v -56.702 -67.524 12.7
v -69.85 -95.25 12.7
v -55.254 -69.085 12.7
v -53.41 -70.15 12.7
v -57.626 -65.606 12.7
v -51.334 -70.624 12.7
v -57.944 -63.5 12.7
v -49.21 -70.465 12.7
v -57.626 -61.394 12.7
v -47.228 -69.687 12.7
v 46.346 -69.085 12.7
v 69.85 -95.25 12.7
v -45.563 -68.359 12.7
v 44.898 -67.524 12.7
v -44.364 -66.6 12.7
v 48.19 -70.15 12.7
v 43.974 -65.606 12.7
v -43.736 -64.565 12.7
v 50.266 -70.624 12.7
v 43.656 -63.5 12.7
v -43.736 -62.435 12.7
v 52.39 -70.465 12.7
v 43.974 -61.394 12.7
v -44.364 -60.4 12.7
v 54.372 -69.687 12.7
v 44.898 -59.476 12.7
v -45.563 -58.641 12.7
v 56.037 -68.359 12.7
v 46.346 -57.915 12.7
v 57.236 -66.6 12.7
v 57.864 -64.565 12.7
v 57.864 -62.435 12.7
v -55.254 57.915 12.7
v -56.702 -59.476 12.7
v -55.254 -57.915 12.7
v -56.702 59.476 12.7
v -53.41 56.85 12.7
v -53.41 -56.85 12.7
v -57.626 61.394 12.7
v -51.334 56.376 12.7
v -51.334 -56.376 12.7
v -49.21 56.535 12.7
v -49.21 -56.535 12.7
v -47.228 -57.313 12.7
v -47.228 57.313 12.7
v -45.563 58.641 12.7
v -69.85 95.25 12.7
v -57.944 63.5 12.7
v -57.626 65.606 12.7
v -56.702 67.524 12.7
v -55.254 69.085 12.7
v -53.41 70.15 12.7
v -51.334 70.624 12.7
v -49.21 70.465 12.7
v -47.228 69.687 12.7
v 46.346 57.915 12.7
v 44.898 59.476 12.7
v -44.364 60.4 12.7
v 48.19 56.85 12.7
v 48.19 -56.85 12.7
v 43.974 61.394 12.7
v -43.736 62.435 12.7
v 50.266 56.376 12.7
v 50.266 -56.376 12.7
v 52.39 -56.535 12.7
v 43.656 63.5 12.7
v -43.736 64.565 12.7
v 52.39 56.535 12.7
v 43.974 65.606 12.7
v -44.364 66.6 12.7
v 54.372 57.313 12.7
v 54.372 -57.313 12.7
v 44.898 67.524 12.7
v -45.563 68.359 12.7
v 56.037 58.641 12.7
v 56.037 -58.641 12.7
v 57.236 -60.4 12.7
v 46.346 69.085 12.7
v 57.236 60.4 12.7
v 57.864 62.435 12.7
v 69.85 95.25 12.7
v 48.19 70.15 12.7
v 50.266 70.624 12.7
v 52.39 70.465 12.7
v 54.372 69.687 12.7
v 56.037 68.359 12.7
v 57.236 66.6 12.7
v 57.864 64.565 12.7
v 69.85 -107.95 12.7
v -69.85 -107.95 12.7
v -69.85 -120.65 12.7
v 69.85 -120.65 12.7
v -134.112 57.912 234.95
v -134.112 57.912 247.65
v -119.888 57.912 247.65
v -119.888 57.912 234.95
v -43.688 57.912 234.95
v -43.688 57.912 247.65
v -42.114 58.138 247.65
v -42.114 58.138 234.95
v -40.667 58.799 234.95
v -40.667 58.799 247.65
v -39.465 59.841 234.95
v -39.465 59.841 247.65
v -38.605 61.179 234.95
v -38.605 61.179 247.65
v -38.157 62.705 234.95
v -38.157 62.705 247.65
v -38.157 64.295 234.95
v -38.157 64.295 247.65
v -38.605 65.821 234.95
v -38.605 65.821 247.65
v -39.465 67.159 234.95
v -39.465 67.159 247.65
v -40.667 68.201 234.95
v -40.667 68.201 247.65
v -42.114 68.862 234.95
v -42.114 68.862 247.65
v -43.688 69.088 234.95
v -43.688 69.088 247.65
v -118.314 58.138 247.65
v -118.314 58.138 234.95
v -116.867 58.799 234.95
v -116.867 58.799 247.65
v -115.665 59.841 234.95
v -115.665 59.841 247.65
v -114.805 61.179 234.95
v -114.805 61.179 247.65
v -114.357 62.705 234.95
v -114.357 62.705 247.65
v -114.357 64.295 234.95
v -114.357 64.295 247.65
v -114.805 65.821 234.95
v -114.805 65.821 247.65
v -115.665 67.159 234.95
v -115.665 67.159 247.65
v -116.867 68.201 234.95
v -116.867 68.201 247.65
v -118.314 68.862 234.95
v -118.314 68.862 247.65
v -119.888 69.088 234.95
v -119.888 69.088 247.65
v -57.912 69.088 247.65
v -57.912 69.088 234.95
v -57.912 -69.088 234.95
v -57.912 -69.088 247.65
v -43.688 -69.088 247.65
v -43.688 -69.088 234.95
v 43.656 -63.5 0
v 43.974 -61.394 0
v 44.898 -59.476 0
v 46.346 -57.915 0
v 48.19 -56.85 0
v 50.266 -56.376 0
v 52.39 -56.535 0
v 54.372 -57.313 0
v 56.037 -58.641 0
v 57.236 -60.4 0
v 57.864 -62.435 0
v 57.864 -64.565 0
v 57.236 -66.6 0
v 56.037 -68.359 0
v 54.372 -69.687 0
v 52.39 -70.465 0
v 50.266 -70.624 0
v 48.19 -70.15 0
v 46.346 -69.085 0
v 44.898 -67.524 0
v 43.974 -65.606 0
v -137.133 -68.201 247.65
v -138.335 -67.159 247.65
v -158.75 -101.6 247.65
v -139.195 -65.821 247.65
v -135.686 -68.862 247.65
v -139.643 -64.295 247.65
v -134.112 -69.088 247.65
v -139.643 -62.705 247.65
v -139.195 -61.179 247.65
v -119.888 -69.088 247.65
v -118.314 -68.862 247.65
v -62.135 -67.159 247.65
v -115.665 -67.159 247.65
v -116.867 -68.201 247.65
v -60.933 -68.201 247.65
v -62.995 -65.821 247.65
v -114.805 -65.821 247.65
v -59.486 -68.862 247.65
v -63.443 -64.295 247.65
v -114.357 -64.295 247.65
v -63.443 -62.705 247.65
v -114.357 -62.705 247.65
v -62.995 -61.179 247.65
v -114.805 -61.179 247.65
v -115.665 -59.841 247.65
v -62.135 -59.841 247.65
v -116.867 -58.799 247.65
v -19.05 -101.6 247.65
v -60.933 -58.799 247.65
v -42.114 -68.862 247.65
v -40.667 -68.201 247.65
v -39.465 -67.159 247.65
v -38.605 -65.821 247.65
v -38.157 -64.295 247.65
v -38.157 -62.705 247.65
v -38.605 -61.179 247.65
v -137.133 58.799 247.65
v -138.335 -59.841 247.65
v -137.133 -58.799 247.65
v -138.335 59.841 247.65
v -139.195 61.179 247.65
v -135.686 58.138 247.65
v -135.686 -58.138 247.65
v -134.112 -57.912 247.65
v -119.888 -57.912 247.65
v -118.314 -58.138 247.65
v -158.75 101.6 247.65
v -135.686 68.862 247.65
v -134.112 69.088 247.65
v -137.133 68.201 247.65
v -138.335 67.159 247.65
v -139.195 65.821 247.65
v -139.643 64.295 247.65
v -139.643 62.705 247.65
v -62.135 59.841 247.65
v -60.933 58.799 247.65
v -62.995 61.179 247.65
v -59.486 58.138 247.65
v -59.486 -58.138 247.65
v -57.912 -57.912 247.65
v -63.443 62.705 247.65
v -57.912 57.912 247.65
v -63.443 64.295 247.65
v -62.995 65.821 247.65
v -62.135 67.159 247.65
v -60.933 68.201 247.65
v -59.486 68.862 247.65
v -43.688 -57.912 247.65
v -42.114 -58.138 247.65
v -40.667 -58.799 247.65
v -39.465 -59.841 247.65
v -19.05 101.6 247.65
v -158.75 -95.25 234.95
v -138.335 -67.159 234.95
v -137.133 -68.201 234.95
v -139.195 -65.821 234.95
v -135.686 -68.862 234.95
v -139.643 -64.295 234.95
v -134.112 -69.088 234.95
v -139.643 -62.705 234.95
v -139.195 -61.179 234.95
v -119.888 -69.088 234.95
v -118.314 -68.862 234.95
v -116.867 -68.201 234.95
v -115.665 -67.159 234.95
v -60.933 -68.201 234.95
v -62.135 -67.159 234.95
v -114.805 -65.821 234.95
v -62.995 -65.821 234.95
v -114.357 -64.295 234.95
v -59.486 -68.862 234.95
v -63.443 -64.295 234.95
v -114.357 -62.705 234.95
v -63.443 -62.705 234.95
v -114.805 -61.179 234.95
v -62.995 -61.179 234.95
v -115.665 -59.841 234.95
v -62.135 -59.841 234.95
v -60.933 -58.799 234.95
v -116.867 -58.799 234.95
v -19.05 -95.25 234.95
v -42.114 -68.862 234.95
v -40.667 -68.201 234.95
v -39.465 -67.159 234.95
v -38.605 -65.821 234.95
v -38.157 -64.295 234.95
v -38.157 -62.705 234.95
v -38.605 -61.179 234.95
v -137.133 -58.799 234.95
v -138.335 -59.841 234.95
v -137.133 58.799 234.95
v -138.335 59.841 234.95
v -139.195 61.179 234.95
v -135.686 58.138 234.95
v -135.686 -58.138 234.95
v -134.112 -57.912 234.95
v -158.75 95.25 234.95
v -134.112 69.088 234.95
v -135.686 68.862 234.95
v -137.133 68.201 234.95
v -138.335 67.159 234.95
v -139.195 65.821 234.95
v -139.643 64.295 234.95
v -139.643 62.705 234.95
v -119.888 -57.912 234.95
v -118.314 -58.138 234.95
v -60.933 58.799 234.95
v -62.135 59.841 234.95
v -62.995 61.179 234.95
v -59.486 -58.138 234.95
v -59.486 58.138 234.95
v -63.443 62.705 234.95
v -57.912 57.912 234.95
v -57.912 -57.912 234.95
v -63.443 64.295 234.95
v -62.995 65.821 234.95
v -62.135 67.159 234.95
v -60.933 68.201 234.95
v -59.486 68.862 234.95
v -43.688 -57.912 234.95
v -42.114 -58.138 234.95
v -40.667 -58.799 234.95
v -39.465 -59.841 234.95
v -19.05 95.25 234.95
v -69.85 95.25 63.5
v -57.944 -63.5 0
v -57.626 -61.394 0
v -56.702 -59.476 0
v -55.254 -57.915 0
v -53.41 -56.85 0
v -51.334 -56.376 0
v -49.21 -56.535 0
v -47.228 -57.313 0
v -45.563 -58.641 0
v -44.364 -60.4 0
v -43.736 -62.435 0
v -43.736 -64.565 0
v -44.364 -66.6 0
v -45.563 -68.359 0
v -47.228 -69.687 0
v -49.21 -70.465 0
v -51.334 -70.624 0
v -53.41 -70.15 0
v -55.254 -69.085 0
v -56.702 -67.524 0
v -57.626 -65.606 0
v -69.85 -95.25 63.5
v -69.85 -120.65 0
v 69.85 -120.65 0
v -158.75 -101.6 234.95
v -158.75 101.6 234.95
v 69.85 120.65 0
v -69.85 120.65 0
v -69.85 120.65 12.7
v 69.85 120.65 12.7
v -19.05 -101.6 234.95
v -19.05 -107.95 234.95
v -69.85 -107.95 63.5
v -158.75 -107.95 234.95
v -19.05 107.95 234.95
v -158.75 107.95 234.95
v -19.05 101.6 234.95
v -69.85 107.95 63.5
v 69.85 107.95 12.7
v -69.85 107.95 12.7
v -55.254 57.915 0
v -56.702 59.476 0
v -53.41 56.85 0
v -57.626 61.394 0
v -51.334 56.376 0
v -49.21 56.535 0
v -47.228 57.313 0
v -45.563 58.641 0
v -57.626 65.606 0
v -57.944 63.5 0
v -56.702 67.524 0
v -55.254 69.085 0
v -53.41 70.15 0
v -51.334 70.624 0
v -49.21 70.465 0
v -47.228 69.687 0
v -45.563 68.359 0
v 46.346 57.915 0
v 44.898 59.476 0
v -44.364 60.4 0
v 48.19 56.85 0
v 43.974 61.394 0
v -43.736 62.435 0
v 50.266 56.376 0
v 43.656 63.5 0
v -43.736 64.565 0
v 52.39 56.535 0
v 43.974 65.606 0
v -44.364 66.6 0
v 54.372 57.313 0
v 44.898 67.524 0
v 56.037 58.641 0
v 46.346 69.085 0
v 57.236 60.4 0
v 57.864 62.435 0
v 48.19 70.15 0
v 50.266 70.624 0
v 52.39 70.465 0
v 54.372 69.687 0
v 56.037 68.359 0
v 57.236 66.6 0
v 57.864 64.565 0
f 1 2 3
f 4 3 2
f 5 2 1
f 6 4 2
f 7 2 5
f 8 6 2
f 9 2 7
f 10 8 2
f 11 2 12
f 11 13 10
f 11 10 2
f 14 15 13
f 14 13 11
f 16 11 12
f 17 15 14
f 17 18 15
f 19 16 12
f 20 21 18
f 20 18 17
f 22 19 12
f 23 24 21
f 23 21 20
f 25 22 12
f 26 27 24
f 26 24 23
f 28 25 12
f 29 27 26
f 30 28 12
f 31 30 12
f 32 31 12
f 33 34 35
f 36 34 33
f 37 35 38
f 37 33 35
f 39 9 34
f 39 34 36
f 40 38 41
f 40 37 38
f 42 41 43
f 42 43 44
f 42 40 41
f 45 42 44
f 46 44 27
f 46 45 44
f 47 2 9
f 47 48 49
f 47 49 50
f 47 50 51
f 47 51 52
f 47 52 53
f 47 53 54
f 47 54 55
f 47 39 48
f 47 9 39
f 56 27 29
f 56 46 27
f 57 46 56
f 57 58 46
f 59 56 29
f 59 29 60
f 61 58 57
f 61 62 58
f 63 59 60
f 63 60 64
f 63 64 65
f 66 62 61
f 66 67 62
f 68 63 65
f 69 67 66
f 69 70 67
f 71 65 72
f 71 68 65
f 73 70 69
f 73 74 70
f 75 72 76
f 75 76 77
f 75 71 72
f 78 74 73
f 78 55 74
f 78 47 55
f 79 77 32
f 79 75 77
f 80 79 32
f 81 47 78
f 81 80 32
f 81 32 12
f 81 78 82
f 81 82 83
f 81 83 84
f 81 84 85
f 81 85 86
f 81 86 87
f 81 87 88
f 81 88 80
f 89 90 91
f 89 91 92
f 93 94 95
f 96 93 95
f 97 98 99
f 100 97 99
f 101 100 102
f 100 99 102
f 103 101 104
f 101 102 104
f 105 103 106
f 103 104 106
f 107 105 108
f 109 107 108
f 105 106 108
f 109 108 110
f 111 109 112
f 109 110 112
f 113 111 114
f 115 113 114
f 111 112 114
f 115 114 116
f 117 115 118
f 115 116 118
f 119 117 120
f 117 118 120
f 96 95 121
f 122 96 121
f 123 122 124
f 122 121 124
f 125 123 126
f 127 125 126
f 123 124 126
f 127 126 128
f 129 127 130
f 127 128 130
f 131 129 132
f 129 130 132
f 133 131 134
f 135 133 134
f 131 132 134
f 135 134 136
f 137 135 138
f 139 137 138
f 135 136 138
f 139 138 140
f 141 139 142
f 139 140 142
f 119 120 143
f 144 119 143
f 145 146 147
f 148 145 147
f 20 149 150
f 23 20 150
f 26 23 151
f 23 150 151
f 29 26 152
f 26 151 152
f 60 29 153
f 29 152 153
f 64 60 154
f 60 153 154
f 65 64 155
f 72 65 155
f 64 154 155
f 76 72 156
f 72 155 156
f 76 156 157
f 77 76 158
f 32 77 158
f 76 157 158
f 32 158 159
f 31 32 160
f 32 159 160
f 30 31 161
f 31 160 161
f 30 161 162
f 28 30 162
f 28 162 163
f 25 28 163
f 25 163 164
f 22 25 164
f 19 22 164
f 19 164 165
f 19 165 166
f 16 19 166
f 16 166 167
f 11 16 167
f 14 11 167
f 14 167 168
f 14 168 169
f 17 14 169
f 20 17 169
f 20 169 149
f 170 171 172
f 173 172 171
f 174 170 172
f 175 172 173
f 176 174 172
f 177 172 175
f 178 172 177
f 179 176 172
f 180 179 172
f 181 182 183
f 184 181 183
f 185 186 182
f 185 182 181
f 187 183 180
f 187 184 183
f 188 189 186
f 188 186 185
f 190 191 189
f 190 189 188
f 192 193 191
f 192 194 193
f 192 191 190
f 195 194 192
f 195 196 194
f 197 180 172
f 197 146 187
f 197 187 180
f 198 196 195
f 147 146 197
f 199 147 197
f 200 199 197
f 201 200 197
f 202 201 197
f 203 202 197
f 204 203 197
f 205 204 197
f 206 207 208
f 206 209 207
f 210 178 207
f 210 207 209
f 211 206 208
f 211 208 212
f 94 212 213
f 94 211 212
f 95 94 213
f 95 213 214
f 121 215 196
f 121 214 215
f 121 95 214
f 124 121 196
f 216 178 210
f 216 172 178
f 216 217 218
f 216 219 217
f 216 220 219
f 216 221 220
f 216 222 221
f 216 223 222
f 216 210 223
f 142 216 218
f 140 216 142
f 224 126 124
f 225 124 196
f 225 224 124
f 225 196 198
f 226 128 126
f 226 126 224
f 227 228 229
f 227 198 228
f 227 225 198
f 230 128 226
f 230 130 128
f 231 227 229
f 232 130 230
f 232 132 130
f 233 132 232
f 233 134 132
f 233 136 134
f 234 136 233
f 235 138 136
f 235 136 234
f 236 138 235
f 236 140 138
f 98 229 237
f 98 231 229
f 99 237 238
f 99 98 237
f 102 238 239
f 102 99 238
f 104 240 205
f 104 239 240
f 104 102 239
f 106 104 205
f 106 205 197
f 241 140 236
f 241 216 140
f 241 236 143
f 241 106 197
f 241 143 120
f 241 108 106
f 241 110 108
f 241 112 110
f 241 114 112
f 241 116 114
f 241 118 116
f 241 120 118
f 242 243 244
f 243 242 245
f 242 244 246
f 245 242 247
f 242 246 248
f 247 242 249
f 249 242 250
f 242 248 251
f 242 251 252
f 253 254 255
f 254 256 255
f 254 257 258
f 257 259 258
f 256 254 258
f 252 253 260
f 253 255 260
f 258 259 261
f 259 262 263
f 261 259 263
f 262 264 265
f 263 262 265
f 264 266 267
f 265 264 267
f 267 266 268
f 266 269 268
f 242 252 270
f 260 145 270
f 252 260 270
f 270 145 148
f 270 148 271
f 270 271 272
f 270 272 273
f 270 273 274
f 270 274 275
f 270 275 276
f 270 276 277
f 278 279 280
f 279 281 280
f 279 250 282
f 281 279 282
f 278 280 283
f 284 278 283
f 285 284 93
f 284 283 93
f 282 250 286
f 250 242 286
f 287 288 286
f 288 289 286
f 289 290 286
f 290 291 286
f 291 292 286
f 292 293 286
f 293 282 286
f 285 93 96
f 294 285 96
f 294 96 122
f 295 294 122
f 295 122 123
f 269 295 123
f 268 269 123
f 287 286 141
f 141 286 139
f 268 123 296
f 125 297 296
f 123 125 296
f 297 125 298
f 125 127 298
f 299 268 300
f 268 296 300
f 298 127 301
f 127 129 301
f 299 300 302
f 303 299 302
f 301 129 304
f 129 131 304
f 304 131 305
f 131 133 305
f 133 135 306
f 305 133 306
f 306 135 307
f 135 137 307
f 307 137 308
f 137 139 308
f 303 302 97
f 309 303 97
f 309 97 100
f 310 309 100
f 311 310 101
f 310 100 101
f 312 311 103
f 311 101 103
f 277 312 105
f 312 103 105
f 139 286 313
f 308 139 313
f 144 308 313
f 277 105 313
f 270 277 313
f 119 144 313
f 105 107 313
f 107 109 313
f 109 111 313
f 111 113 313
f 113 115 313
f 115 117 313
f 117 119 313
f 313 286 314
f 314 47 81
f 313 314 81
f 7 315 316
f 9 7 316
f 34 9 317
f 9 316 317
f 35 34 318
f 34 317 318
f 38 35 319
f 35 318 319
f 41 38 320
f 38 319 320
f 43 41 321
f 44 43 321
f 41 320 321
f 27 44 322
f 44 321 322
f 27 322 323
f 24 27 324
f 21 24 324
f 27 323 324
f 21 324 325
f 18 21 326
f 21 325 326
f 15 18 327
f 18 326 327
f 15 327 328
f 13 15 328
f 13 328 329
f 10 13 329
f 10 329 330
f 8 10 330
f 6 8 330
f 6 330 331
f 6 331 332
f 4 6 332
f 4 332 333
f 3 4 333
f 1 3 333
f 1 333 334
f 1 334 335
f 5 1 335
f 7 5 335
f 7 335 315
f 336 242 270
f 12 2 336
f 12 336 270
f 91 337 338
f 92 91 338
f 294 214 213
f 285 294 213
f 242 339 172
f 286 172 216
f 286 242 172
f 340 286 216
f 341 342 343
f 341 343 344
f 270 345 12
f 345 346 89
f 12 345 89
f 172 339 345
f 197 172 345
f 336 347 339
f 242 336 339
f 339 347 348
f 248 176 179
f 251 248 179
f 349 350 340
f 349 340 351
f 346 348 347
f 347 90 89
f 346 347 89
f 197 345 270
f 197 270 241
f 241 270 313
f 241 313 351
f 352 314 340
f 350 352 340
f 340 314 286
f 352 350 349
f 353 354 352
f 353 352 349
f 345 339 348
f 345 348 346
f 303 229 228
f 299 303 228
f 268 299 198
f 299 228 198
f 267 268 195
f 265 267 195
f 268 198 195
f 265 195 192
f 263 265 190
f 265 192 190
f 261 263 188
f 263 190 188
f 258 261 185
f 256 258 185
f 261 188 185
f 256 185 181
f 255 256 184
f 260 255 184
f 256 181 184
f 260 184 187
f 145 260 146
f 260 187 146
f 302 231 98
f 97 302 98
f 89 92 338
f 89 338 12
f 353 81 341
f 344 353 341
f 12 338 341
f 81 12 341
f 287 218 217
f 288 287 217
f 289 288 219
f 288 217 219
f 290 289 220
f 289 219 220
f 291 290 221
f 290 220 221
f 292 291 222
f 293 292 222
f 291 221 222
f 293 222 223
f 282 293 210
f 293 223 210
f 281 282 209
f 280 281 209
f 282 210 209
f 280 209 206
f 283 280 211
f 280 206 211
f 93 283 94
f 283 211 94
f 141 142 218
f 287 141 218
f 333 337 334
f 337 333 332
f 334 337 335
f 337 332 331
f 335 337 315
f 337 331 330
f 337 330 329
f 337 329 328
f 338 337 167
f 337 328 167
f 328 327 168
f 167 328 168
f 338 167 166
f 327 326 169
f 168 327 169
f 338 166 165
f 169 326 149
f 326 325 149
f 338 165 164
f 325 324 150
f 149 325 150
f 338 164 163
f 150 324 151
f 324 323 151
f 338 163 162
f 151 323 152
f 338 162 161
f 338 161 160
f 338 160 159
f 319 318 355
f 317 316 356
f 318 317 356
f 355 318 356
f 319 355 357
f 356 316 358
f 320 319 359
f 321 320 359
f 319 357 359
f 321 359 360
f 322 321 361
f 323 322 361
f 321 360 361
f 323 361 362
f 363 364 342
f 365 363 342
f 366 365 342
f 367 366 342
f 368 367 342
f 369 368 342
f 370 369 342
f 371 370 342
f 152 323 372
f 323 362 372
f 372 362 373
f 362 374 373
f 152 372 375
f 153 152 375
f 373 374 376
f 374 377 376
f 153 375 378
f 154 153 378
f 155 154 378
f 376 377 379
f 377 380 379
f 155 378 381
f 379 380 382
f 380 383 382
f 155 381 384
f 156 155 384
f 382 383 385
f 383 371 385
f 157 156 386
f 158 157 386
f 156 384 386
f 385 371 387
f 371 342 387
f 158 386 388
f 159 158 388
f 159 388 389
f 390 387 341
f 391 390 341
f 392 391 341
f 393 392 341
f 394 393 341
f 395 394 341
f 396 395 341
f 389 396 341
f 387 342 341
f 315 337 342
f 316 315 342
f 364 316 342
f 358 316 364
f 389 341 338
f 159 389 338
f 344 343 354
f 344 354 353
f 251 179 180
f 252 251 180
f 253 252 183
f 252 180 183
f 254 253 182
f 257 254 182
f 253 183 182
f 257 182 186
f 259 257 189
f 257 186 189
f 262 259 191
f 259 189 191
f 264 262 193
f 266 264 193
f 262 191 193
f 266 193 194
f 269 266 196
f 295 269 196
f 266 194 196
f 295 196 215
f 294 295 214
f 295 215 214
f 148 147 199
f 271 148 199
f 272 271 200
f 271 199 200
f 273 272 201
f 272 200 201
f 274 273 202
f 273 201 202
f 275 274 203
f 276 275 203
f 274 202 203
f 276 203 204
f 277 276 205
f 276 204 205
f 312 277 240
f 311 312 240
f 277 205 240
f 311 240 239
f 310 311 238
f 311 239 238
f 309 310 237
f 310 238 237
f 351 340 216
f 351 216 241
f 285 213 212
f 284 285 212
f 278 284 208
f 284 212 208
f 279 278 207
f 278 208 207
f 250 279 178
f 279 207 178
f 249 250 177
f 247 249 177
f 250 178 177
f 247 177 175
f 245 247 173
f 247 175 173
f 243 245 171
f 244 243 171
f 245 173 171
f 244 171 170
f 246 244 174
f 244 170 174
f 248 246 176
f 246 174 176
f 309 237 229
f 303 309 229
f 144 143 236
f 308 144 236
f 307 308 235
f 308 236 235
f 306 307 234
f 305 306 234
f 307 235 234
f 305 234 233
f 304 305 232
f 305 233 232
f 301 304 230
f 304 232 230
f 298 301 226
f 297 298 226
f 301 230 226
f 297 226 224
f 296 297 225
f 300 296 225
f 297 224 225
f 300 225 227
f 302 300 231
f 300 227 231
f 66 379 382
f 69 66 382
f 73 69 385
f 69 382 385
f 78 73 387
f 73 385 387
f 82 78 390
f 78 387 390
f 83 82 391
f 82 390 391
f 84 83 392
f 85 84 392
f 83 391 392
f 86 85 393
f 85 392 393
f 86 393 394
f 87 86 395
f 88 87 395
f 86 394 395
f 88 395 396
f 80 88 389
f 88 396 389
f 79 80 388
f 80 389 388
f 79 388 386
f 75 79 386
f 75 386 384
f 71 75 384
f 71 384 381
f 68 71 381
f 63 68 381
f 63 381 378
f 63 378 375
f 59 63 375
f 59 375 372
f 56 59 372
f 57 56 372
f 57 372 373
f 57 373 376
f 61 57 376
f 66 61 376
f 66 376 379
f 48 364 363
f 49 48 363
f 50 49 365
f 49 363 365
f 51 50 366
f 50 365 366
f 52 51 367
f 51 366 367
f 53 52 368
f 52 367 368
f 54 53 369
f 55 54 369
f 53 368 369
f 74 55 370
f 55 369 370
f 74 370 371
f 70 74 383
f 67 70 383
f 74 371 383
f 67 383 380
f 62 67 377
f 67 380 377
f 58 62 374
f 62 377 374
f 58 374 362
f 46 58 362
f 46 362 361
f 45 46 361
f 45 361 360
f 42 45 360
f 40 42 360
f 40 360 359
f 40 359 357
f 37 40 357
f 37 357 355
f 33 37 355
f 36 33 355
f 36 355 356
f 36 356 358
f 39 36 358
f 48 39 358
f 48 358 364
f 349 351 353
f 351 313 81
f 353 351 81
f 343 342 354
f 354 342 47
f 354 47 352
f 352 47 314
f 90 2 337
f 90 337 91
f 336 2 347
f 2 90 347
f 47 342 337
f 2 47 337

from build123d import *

# Parameters (mm, degrees)
F0_W      = 139.7
F0_H      = 241.3
F1_DEPTH  = 12.7
F3_D      = 14.2875
F4_W      = 228.6
F4_H      = 12.7
F5_DEPTH  = 222.25
F7_DEPTH  = 228.601
F9_DEPTH  = 228.601
F10_W     = 139.7
F10_H     = 203.2
F11_DEPTH = 12.7
F13_DEPTH = 25.4


with BuildPart() as f1:
    # F0 (on Top) → F1 (new body)
    with BuildSketch(Plane.XY):
        Rectangle(F0_W, F0_H)
    extrude(amount=F1_DEPTH)

    # F3 (through all)
    with Locations(Plane.XY.offset(12.7)):
        with Locations((-50.8, 63.5), (50.8, 63.5), (50.8, -63.5), (-50.8, -63.5)):
            Hole(F3_D / 2)

    # F4 (on face) → F5 (join)
    with BuildSketch(Plane.XY.offset(12.7)):
        with Locations((-44.45, -101.6)):
            Rectangle(F4_W, F4_H)
        with Locations((-44.45, 101.6)):
            Rectangle(F4_W, F4_H)
    extrude(amount=F5_DEPTH)

    # F6 (on face) → F7 (cut, through all)
    with BuildSketch(Plane.XZ.offset(107.95)):
        Polygon((-158.75, 12.7), (-69.85, 12.7), (-69.85, 63.5), (-158.75, 234.95), align=None)
    extrude(amount=-F7_DEPTH, mode=Mode.SUBTRACT)

    # F8 (on face) → F9 (cut, through all)
    with BuildSketch(Plane.XZ.offset(107.95)):
        Polygon((69.85, 234.95), (-19.05, 234.95), (69.85, 12.7), align=None)
    extrude(amount=-F9_DEPTH, mode=Mode.SUBTRACT)

    # F10 (on face) → F11 (join)
    with BuildSketch(Plane.XY.offset(234.95)):
        with Locations((-88.9, 0)):
            Rectangle(F10_W, F10_H)
    extrude(amount=F11_DEPTH)

    # F12 (on face) → F13 (cut)
    with BuildSketch(Plane.XY.offset(247.65)):
        with BuildLine():
            ThreePointArc((-134.112, -57.912), (-139.7, -63.5), (-134.112, -69.088))
            Line((-134.112, -69.088), (-119.888, -69.088))
            ThreePointArc((-119.888, -69.088), (-114.3, -63.5), (-119.888, -57.912))
            Line((-119.888, -57.912), (-134.112, -57.912))
        make_face()
        with BuildLine():
            Line((-57.912, -69.088), (-43.688, -69.088))
            ThreePointArc((-43.688, -69.088), (-38.1, -63.5), (-43.688, -57.912))
            Line((-43.688, -57.912), (-57.912, -57.912))
            ThreePointArc((-57.912, -57.912), (-63.5, -63.5), (-57.912, -69.088))
        make_face()
        with BuildLine():
            Line((-57.912, 57.912), (-43.688, 57.912))
            ThreePointArc((-43.688, 57.912), (-38.1, 63.5), (-43.688, 69.088))
            Line((-43.688, 69.088), (-57.912, 69.088))
            ThreePointArc((-57.912, 69.088), (-63.5, 63.5), (-57.912, 57.912))
        make_face()
        with BuildLine():
            Line((-119.888, 69.088), (-134.112, 69.088))
            ThreePointArc((-134.112, 69.088), (-139.7, 63.5), (-134.112, 57.912))
            Line((-134.112, 57.912), (-119.888, 57.912))
            ThreePointArc((-119.888, 57.912), (-114.3, 63.5), (-119.888, 69.088))
        make_face()
    extrude(amount=-F13_DEPTH, mode=Mode.SUBTRACT)


solid = f1.part
